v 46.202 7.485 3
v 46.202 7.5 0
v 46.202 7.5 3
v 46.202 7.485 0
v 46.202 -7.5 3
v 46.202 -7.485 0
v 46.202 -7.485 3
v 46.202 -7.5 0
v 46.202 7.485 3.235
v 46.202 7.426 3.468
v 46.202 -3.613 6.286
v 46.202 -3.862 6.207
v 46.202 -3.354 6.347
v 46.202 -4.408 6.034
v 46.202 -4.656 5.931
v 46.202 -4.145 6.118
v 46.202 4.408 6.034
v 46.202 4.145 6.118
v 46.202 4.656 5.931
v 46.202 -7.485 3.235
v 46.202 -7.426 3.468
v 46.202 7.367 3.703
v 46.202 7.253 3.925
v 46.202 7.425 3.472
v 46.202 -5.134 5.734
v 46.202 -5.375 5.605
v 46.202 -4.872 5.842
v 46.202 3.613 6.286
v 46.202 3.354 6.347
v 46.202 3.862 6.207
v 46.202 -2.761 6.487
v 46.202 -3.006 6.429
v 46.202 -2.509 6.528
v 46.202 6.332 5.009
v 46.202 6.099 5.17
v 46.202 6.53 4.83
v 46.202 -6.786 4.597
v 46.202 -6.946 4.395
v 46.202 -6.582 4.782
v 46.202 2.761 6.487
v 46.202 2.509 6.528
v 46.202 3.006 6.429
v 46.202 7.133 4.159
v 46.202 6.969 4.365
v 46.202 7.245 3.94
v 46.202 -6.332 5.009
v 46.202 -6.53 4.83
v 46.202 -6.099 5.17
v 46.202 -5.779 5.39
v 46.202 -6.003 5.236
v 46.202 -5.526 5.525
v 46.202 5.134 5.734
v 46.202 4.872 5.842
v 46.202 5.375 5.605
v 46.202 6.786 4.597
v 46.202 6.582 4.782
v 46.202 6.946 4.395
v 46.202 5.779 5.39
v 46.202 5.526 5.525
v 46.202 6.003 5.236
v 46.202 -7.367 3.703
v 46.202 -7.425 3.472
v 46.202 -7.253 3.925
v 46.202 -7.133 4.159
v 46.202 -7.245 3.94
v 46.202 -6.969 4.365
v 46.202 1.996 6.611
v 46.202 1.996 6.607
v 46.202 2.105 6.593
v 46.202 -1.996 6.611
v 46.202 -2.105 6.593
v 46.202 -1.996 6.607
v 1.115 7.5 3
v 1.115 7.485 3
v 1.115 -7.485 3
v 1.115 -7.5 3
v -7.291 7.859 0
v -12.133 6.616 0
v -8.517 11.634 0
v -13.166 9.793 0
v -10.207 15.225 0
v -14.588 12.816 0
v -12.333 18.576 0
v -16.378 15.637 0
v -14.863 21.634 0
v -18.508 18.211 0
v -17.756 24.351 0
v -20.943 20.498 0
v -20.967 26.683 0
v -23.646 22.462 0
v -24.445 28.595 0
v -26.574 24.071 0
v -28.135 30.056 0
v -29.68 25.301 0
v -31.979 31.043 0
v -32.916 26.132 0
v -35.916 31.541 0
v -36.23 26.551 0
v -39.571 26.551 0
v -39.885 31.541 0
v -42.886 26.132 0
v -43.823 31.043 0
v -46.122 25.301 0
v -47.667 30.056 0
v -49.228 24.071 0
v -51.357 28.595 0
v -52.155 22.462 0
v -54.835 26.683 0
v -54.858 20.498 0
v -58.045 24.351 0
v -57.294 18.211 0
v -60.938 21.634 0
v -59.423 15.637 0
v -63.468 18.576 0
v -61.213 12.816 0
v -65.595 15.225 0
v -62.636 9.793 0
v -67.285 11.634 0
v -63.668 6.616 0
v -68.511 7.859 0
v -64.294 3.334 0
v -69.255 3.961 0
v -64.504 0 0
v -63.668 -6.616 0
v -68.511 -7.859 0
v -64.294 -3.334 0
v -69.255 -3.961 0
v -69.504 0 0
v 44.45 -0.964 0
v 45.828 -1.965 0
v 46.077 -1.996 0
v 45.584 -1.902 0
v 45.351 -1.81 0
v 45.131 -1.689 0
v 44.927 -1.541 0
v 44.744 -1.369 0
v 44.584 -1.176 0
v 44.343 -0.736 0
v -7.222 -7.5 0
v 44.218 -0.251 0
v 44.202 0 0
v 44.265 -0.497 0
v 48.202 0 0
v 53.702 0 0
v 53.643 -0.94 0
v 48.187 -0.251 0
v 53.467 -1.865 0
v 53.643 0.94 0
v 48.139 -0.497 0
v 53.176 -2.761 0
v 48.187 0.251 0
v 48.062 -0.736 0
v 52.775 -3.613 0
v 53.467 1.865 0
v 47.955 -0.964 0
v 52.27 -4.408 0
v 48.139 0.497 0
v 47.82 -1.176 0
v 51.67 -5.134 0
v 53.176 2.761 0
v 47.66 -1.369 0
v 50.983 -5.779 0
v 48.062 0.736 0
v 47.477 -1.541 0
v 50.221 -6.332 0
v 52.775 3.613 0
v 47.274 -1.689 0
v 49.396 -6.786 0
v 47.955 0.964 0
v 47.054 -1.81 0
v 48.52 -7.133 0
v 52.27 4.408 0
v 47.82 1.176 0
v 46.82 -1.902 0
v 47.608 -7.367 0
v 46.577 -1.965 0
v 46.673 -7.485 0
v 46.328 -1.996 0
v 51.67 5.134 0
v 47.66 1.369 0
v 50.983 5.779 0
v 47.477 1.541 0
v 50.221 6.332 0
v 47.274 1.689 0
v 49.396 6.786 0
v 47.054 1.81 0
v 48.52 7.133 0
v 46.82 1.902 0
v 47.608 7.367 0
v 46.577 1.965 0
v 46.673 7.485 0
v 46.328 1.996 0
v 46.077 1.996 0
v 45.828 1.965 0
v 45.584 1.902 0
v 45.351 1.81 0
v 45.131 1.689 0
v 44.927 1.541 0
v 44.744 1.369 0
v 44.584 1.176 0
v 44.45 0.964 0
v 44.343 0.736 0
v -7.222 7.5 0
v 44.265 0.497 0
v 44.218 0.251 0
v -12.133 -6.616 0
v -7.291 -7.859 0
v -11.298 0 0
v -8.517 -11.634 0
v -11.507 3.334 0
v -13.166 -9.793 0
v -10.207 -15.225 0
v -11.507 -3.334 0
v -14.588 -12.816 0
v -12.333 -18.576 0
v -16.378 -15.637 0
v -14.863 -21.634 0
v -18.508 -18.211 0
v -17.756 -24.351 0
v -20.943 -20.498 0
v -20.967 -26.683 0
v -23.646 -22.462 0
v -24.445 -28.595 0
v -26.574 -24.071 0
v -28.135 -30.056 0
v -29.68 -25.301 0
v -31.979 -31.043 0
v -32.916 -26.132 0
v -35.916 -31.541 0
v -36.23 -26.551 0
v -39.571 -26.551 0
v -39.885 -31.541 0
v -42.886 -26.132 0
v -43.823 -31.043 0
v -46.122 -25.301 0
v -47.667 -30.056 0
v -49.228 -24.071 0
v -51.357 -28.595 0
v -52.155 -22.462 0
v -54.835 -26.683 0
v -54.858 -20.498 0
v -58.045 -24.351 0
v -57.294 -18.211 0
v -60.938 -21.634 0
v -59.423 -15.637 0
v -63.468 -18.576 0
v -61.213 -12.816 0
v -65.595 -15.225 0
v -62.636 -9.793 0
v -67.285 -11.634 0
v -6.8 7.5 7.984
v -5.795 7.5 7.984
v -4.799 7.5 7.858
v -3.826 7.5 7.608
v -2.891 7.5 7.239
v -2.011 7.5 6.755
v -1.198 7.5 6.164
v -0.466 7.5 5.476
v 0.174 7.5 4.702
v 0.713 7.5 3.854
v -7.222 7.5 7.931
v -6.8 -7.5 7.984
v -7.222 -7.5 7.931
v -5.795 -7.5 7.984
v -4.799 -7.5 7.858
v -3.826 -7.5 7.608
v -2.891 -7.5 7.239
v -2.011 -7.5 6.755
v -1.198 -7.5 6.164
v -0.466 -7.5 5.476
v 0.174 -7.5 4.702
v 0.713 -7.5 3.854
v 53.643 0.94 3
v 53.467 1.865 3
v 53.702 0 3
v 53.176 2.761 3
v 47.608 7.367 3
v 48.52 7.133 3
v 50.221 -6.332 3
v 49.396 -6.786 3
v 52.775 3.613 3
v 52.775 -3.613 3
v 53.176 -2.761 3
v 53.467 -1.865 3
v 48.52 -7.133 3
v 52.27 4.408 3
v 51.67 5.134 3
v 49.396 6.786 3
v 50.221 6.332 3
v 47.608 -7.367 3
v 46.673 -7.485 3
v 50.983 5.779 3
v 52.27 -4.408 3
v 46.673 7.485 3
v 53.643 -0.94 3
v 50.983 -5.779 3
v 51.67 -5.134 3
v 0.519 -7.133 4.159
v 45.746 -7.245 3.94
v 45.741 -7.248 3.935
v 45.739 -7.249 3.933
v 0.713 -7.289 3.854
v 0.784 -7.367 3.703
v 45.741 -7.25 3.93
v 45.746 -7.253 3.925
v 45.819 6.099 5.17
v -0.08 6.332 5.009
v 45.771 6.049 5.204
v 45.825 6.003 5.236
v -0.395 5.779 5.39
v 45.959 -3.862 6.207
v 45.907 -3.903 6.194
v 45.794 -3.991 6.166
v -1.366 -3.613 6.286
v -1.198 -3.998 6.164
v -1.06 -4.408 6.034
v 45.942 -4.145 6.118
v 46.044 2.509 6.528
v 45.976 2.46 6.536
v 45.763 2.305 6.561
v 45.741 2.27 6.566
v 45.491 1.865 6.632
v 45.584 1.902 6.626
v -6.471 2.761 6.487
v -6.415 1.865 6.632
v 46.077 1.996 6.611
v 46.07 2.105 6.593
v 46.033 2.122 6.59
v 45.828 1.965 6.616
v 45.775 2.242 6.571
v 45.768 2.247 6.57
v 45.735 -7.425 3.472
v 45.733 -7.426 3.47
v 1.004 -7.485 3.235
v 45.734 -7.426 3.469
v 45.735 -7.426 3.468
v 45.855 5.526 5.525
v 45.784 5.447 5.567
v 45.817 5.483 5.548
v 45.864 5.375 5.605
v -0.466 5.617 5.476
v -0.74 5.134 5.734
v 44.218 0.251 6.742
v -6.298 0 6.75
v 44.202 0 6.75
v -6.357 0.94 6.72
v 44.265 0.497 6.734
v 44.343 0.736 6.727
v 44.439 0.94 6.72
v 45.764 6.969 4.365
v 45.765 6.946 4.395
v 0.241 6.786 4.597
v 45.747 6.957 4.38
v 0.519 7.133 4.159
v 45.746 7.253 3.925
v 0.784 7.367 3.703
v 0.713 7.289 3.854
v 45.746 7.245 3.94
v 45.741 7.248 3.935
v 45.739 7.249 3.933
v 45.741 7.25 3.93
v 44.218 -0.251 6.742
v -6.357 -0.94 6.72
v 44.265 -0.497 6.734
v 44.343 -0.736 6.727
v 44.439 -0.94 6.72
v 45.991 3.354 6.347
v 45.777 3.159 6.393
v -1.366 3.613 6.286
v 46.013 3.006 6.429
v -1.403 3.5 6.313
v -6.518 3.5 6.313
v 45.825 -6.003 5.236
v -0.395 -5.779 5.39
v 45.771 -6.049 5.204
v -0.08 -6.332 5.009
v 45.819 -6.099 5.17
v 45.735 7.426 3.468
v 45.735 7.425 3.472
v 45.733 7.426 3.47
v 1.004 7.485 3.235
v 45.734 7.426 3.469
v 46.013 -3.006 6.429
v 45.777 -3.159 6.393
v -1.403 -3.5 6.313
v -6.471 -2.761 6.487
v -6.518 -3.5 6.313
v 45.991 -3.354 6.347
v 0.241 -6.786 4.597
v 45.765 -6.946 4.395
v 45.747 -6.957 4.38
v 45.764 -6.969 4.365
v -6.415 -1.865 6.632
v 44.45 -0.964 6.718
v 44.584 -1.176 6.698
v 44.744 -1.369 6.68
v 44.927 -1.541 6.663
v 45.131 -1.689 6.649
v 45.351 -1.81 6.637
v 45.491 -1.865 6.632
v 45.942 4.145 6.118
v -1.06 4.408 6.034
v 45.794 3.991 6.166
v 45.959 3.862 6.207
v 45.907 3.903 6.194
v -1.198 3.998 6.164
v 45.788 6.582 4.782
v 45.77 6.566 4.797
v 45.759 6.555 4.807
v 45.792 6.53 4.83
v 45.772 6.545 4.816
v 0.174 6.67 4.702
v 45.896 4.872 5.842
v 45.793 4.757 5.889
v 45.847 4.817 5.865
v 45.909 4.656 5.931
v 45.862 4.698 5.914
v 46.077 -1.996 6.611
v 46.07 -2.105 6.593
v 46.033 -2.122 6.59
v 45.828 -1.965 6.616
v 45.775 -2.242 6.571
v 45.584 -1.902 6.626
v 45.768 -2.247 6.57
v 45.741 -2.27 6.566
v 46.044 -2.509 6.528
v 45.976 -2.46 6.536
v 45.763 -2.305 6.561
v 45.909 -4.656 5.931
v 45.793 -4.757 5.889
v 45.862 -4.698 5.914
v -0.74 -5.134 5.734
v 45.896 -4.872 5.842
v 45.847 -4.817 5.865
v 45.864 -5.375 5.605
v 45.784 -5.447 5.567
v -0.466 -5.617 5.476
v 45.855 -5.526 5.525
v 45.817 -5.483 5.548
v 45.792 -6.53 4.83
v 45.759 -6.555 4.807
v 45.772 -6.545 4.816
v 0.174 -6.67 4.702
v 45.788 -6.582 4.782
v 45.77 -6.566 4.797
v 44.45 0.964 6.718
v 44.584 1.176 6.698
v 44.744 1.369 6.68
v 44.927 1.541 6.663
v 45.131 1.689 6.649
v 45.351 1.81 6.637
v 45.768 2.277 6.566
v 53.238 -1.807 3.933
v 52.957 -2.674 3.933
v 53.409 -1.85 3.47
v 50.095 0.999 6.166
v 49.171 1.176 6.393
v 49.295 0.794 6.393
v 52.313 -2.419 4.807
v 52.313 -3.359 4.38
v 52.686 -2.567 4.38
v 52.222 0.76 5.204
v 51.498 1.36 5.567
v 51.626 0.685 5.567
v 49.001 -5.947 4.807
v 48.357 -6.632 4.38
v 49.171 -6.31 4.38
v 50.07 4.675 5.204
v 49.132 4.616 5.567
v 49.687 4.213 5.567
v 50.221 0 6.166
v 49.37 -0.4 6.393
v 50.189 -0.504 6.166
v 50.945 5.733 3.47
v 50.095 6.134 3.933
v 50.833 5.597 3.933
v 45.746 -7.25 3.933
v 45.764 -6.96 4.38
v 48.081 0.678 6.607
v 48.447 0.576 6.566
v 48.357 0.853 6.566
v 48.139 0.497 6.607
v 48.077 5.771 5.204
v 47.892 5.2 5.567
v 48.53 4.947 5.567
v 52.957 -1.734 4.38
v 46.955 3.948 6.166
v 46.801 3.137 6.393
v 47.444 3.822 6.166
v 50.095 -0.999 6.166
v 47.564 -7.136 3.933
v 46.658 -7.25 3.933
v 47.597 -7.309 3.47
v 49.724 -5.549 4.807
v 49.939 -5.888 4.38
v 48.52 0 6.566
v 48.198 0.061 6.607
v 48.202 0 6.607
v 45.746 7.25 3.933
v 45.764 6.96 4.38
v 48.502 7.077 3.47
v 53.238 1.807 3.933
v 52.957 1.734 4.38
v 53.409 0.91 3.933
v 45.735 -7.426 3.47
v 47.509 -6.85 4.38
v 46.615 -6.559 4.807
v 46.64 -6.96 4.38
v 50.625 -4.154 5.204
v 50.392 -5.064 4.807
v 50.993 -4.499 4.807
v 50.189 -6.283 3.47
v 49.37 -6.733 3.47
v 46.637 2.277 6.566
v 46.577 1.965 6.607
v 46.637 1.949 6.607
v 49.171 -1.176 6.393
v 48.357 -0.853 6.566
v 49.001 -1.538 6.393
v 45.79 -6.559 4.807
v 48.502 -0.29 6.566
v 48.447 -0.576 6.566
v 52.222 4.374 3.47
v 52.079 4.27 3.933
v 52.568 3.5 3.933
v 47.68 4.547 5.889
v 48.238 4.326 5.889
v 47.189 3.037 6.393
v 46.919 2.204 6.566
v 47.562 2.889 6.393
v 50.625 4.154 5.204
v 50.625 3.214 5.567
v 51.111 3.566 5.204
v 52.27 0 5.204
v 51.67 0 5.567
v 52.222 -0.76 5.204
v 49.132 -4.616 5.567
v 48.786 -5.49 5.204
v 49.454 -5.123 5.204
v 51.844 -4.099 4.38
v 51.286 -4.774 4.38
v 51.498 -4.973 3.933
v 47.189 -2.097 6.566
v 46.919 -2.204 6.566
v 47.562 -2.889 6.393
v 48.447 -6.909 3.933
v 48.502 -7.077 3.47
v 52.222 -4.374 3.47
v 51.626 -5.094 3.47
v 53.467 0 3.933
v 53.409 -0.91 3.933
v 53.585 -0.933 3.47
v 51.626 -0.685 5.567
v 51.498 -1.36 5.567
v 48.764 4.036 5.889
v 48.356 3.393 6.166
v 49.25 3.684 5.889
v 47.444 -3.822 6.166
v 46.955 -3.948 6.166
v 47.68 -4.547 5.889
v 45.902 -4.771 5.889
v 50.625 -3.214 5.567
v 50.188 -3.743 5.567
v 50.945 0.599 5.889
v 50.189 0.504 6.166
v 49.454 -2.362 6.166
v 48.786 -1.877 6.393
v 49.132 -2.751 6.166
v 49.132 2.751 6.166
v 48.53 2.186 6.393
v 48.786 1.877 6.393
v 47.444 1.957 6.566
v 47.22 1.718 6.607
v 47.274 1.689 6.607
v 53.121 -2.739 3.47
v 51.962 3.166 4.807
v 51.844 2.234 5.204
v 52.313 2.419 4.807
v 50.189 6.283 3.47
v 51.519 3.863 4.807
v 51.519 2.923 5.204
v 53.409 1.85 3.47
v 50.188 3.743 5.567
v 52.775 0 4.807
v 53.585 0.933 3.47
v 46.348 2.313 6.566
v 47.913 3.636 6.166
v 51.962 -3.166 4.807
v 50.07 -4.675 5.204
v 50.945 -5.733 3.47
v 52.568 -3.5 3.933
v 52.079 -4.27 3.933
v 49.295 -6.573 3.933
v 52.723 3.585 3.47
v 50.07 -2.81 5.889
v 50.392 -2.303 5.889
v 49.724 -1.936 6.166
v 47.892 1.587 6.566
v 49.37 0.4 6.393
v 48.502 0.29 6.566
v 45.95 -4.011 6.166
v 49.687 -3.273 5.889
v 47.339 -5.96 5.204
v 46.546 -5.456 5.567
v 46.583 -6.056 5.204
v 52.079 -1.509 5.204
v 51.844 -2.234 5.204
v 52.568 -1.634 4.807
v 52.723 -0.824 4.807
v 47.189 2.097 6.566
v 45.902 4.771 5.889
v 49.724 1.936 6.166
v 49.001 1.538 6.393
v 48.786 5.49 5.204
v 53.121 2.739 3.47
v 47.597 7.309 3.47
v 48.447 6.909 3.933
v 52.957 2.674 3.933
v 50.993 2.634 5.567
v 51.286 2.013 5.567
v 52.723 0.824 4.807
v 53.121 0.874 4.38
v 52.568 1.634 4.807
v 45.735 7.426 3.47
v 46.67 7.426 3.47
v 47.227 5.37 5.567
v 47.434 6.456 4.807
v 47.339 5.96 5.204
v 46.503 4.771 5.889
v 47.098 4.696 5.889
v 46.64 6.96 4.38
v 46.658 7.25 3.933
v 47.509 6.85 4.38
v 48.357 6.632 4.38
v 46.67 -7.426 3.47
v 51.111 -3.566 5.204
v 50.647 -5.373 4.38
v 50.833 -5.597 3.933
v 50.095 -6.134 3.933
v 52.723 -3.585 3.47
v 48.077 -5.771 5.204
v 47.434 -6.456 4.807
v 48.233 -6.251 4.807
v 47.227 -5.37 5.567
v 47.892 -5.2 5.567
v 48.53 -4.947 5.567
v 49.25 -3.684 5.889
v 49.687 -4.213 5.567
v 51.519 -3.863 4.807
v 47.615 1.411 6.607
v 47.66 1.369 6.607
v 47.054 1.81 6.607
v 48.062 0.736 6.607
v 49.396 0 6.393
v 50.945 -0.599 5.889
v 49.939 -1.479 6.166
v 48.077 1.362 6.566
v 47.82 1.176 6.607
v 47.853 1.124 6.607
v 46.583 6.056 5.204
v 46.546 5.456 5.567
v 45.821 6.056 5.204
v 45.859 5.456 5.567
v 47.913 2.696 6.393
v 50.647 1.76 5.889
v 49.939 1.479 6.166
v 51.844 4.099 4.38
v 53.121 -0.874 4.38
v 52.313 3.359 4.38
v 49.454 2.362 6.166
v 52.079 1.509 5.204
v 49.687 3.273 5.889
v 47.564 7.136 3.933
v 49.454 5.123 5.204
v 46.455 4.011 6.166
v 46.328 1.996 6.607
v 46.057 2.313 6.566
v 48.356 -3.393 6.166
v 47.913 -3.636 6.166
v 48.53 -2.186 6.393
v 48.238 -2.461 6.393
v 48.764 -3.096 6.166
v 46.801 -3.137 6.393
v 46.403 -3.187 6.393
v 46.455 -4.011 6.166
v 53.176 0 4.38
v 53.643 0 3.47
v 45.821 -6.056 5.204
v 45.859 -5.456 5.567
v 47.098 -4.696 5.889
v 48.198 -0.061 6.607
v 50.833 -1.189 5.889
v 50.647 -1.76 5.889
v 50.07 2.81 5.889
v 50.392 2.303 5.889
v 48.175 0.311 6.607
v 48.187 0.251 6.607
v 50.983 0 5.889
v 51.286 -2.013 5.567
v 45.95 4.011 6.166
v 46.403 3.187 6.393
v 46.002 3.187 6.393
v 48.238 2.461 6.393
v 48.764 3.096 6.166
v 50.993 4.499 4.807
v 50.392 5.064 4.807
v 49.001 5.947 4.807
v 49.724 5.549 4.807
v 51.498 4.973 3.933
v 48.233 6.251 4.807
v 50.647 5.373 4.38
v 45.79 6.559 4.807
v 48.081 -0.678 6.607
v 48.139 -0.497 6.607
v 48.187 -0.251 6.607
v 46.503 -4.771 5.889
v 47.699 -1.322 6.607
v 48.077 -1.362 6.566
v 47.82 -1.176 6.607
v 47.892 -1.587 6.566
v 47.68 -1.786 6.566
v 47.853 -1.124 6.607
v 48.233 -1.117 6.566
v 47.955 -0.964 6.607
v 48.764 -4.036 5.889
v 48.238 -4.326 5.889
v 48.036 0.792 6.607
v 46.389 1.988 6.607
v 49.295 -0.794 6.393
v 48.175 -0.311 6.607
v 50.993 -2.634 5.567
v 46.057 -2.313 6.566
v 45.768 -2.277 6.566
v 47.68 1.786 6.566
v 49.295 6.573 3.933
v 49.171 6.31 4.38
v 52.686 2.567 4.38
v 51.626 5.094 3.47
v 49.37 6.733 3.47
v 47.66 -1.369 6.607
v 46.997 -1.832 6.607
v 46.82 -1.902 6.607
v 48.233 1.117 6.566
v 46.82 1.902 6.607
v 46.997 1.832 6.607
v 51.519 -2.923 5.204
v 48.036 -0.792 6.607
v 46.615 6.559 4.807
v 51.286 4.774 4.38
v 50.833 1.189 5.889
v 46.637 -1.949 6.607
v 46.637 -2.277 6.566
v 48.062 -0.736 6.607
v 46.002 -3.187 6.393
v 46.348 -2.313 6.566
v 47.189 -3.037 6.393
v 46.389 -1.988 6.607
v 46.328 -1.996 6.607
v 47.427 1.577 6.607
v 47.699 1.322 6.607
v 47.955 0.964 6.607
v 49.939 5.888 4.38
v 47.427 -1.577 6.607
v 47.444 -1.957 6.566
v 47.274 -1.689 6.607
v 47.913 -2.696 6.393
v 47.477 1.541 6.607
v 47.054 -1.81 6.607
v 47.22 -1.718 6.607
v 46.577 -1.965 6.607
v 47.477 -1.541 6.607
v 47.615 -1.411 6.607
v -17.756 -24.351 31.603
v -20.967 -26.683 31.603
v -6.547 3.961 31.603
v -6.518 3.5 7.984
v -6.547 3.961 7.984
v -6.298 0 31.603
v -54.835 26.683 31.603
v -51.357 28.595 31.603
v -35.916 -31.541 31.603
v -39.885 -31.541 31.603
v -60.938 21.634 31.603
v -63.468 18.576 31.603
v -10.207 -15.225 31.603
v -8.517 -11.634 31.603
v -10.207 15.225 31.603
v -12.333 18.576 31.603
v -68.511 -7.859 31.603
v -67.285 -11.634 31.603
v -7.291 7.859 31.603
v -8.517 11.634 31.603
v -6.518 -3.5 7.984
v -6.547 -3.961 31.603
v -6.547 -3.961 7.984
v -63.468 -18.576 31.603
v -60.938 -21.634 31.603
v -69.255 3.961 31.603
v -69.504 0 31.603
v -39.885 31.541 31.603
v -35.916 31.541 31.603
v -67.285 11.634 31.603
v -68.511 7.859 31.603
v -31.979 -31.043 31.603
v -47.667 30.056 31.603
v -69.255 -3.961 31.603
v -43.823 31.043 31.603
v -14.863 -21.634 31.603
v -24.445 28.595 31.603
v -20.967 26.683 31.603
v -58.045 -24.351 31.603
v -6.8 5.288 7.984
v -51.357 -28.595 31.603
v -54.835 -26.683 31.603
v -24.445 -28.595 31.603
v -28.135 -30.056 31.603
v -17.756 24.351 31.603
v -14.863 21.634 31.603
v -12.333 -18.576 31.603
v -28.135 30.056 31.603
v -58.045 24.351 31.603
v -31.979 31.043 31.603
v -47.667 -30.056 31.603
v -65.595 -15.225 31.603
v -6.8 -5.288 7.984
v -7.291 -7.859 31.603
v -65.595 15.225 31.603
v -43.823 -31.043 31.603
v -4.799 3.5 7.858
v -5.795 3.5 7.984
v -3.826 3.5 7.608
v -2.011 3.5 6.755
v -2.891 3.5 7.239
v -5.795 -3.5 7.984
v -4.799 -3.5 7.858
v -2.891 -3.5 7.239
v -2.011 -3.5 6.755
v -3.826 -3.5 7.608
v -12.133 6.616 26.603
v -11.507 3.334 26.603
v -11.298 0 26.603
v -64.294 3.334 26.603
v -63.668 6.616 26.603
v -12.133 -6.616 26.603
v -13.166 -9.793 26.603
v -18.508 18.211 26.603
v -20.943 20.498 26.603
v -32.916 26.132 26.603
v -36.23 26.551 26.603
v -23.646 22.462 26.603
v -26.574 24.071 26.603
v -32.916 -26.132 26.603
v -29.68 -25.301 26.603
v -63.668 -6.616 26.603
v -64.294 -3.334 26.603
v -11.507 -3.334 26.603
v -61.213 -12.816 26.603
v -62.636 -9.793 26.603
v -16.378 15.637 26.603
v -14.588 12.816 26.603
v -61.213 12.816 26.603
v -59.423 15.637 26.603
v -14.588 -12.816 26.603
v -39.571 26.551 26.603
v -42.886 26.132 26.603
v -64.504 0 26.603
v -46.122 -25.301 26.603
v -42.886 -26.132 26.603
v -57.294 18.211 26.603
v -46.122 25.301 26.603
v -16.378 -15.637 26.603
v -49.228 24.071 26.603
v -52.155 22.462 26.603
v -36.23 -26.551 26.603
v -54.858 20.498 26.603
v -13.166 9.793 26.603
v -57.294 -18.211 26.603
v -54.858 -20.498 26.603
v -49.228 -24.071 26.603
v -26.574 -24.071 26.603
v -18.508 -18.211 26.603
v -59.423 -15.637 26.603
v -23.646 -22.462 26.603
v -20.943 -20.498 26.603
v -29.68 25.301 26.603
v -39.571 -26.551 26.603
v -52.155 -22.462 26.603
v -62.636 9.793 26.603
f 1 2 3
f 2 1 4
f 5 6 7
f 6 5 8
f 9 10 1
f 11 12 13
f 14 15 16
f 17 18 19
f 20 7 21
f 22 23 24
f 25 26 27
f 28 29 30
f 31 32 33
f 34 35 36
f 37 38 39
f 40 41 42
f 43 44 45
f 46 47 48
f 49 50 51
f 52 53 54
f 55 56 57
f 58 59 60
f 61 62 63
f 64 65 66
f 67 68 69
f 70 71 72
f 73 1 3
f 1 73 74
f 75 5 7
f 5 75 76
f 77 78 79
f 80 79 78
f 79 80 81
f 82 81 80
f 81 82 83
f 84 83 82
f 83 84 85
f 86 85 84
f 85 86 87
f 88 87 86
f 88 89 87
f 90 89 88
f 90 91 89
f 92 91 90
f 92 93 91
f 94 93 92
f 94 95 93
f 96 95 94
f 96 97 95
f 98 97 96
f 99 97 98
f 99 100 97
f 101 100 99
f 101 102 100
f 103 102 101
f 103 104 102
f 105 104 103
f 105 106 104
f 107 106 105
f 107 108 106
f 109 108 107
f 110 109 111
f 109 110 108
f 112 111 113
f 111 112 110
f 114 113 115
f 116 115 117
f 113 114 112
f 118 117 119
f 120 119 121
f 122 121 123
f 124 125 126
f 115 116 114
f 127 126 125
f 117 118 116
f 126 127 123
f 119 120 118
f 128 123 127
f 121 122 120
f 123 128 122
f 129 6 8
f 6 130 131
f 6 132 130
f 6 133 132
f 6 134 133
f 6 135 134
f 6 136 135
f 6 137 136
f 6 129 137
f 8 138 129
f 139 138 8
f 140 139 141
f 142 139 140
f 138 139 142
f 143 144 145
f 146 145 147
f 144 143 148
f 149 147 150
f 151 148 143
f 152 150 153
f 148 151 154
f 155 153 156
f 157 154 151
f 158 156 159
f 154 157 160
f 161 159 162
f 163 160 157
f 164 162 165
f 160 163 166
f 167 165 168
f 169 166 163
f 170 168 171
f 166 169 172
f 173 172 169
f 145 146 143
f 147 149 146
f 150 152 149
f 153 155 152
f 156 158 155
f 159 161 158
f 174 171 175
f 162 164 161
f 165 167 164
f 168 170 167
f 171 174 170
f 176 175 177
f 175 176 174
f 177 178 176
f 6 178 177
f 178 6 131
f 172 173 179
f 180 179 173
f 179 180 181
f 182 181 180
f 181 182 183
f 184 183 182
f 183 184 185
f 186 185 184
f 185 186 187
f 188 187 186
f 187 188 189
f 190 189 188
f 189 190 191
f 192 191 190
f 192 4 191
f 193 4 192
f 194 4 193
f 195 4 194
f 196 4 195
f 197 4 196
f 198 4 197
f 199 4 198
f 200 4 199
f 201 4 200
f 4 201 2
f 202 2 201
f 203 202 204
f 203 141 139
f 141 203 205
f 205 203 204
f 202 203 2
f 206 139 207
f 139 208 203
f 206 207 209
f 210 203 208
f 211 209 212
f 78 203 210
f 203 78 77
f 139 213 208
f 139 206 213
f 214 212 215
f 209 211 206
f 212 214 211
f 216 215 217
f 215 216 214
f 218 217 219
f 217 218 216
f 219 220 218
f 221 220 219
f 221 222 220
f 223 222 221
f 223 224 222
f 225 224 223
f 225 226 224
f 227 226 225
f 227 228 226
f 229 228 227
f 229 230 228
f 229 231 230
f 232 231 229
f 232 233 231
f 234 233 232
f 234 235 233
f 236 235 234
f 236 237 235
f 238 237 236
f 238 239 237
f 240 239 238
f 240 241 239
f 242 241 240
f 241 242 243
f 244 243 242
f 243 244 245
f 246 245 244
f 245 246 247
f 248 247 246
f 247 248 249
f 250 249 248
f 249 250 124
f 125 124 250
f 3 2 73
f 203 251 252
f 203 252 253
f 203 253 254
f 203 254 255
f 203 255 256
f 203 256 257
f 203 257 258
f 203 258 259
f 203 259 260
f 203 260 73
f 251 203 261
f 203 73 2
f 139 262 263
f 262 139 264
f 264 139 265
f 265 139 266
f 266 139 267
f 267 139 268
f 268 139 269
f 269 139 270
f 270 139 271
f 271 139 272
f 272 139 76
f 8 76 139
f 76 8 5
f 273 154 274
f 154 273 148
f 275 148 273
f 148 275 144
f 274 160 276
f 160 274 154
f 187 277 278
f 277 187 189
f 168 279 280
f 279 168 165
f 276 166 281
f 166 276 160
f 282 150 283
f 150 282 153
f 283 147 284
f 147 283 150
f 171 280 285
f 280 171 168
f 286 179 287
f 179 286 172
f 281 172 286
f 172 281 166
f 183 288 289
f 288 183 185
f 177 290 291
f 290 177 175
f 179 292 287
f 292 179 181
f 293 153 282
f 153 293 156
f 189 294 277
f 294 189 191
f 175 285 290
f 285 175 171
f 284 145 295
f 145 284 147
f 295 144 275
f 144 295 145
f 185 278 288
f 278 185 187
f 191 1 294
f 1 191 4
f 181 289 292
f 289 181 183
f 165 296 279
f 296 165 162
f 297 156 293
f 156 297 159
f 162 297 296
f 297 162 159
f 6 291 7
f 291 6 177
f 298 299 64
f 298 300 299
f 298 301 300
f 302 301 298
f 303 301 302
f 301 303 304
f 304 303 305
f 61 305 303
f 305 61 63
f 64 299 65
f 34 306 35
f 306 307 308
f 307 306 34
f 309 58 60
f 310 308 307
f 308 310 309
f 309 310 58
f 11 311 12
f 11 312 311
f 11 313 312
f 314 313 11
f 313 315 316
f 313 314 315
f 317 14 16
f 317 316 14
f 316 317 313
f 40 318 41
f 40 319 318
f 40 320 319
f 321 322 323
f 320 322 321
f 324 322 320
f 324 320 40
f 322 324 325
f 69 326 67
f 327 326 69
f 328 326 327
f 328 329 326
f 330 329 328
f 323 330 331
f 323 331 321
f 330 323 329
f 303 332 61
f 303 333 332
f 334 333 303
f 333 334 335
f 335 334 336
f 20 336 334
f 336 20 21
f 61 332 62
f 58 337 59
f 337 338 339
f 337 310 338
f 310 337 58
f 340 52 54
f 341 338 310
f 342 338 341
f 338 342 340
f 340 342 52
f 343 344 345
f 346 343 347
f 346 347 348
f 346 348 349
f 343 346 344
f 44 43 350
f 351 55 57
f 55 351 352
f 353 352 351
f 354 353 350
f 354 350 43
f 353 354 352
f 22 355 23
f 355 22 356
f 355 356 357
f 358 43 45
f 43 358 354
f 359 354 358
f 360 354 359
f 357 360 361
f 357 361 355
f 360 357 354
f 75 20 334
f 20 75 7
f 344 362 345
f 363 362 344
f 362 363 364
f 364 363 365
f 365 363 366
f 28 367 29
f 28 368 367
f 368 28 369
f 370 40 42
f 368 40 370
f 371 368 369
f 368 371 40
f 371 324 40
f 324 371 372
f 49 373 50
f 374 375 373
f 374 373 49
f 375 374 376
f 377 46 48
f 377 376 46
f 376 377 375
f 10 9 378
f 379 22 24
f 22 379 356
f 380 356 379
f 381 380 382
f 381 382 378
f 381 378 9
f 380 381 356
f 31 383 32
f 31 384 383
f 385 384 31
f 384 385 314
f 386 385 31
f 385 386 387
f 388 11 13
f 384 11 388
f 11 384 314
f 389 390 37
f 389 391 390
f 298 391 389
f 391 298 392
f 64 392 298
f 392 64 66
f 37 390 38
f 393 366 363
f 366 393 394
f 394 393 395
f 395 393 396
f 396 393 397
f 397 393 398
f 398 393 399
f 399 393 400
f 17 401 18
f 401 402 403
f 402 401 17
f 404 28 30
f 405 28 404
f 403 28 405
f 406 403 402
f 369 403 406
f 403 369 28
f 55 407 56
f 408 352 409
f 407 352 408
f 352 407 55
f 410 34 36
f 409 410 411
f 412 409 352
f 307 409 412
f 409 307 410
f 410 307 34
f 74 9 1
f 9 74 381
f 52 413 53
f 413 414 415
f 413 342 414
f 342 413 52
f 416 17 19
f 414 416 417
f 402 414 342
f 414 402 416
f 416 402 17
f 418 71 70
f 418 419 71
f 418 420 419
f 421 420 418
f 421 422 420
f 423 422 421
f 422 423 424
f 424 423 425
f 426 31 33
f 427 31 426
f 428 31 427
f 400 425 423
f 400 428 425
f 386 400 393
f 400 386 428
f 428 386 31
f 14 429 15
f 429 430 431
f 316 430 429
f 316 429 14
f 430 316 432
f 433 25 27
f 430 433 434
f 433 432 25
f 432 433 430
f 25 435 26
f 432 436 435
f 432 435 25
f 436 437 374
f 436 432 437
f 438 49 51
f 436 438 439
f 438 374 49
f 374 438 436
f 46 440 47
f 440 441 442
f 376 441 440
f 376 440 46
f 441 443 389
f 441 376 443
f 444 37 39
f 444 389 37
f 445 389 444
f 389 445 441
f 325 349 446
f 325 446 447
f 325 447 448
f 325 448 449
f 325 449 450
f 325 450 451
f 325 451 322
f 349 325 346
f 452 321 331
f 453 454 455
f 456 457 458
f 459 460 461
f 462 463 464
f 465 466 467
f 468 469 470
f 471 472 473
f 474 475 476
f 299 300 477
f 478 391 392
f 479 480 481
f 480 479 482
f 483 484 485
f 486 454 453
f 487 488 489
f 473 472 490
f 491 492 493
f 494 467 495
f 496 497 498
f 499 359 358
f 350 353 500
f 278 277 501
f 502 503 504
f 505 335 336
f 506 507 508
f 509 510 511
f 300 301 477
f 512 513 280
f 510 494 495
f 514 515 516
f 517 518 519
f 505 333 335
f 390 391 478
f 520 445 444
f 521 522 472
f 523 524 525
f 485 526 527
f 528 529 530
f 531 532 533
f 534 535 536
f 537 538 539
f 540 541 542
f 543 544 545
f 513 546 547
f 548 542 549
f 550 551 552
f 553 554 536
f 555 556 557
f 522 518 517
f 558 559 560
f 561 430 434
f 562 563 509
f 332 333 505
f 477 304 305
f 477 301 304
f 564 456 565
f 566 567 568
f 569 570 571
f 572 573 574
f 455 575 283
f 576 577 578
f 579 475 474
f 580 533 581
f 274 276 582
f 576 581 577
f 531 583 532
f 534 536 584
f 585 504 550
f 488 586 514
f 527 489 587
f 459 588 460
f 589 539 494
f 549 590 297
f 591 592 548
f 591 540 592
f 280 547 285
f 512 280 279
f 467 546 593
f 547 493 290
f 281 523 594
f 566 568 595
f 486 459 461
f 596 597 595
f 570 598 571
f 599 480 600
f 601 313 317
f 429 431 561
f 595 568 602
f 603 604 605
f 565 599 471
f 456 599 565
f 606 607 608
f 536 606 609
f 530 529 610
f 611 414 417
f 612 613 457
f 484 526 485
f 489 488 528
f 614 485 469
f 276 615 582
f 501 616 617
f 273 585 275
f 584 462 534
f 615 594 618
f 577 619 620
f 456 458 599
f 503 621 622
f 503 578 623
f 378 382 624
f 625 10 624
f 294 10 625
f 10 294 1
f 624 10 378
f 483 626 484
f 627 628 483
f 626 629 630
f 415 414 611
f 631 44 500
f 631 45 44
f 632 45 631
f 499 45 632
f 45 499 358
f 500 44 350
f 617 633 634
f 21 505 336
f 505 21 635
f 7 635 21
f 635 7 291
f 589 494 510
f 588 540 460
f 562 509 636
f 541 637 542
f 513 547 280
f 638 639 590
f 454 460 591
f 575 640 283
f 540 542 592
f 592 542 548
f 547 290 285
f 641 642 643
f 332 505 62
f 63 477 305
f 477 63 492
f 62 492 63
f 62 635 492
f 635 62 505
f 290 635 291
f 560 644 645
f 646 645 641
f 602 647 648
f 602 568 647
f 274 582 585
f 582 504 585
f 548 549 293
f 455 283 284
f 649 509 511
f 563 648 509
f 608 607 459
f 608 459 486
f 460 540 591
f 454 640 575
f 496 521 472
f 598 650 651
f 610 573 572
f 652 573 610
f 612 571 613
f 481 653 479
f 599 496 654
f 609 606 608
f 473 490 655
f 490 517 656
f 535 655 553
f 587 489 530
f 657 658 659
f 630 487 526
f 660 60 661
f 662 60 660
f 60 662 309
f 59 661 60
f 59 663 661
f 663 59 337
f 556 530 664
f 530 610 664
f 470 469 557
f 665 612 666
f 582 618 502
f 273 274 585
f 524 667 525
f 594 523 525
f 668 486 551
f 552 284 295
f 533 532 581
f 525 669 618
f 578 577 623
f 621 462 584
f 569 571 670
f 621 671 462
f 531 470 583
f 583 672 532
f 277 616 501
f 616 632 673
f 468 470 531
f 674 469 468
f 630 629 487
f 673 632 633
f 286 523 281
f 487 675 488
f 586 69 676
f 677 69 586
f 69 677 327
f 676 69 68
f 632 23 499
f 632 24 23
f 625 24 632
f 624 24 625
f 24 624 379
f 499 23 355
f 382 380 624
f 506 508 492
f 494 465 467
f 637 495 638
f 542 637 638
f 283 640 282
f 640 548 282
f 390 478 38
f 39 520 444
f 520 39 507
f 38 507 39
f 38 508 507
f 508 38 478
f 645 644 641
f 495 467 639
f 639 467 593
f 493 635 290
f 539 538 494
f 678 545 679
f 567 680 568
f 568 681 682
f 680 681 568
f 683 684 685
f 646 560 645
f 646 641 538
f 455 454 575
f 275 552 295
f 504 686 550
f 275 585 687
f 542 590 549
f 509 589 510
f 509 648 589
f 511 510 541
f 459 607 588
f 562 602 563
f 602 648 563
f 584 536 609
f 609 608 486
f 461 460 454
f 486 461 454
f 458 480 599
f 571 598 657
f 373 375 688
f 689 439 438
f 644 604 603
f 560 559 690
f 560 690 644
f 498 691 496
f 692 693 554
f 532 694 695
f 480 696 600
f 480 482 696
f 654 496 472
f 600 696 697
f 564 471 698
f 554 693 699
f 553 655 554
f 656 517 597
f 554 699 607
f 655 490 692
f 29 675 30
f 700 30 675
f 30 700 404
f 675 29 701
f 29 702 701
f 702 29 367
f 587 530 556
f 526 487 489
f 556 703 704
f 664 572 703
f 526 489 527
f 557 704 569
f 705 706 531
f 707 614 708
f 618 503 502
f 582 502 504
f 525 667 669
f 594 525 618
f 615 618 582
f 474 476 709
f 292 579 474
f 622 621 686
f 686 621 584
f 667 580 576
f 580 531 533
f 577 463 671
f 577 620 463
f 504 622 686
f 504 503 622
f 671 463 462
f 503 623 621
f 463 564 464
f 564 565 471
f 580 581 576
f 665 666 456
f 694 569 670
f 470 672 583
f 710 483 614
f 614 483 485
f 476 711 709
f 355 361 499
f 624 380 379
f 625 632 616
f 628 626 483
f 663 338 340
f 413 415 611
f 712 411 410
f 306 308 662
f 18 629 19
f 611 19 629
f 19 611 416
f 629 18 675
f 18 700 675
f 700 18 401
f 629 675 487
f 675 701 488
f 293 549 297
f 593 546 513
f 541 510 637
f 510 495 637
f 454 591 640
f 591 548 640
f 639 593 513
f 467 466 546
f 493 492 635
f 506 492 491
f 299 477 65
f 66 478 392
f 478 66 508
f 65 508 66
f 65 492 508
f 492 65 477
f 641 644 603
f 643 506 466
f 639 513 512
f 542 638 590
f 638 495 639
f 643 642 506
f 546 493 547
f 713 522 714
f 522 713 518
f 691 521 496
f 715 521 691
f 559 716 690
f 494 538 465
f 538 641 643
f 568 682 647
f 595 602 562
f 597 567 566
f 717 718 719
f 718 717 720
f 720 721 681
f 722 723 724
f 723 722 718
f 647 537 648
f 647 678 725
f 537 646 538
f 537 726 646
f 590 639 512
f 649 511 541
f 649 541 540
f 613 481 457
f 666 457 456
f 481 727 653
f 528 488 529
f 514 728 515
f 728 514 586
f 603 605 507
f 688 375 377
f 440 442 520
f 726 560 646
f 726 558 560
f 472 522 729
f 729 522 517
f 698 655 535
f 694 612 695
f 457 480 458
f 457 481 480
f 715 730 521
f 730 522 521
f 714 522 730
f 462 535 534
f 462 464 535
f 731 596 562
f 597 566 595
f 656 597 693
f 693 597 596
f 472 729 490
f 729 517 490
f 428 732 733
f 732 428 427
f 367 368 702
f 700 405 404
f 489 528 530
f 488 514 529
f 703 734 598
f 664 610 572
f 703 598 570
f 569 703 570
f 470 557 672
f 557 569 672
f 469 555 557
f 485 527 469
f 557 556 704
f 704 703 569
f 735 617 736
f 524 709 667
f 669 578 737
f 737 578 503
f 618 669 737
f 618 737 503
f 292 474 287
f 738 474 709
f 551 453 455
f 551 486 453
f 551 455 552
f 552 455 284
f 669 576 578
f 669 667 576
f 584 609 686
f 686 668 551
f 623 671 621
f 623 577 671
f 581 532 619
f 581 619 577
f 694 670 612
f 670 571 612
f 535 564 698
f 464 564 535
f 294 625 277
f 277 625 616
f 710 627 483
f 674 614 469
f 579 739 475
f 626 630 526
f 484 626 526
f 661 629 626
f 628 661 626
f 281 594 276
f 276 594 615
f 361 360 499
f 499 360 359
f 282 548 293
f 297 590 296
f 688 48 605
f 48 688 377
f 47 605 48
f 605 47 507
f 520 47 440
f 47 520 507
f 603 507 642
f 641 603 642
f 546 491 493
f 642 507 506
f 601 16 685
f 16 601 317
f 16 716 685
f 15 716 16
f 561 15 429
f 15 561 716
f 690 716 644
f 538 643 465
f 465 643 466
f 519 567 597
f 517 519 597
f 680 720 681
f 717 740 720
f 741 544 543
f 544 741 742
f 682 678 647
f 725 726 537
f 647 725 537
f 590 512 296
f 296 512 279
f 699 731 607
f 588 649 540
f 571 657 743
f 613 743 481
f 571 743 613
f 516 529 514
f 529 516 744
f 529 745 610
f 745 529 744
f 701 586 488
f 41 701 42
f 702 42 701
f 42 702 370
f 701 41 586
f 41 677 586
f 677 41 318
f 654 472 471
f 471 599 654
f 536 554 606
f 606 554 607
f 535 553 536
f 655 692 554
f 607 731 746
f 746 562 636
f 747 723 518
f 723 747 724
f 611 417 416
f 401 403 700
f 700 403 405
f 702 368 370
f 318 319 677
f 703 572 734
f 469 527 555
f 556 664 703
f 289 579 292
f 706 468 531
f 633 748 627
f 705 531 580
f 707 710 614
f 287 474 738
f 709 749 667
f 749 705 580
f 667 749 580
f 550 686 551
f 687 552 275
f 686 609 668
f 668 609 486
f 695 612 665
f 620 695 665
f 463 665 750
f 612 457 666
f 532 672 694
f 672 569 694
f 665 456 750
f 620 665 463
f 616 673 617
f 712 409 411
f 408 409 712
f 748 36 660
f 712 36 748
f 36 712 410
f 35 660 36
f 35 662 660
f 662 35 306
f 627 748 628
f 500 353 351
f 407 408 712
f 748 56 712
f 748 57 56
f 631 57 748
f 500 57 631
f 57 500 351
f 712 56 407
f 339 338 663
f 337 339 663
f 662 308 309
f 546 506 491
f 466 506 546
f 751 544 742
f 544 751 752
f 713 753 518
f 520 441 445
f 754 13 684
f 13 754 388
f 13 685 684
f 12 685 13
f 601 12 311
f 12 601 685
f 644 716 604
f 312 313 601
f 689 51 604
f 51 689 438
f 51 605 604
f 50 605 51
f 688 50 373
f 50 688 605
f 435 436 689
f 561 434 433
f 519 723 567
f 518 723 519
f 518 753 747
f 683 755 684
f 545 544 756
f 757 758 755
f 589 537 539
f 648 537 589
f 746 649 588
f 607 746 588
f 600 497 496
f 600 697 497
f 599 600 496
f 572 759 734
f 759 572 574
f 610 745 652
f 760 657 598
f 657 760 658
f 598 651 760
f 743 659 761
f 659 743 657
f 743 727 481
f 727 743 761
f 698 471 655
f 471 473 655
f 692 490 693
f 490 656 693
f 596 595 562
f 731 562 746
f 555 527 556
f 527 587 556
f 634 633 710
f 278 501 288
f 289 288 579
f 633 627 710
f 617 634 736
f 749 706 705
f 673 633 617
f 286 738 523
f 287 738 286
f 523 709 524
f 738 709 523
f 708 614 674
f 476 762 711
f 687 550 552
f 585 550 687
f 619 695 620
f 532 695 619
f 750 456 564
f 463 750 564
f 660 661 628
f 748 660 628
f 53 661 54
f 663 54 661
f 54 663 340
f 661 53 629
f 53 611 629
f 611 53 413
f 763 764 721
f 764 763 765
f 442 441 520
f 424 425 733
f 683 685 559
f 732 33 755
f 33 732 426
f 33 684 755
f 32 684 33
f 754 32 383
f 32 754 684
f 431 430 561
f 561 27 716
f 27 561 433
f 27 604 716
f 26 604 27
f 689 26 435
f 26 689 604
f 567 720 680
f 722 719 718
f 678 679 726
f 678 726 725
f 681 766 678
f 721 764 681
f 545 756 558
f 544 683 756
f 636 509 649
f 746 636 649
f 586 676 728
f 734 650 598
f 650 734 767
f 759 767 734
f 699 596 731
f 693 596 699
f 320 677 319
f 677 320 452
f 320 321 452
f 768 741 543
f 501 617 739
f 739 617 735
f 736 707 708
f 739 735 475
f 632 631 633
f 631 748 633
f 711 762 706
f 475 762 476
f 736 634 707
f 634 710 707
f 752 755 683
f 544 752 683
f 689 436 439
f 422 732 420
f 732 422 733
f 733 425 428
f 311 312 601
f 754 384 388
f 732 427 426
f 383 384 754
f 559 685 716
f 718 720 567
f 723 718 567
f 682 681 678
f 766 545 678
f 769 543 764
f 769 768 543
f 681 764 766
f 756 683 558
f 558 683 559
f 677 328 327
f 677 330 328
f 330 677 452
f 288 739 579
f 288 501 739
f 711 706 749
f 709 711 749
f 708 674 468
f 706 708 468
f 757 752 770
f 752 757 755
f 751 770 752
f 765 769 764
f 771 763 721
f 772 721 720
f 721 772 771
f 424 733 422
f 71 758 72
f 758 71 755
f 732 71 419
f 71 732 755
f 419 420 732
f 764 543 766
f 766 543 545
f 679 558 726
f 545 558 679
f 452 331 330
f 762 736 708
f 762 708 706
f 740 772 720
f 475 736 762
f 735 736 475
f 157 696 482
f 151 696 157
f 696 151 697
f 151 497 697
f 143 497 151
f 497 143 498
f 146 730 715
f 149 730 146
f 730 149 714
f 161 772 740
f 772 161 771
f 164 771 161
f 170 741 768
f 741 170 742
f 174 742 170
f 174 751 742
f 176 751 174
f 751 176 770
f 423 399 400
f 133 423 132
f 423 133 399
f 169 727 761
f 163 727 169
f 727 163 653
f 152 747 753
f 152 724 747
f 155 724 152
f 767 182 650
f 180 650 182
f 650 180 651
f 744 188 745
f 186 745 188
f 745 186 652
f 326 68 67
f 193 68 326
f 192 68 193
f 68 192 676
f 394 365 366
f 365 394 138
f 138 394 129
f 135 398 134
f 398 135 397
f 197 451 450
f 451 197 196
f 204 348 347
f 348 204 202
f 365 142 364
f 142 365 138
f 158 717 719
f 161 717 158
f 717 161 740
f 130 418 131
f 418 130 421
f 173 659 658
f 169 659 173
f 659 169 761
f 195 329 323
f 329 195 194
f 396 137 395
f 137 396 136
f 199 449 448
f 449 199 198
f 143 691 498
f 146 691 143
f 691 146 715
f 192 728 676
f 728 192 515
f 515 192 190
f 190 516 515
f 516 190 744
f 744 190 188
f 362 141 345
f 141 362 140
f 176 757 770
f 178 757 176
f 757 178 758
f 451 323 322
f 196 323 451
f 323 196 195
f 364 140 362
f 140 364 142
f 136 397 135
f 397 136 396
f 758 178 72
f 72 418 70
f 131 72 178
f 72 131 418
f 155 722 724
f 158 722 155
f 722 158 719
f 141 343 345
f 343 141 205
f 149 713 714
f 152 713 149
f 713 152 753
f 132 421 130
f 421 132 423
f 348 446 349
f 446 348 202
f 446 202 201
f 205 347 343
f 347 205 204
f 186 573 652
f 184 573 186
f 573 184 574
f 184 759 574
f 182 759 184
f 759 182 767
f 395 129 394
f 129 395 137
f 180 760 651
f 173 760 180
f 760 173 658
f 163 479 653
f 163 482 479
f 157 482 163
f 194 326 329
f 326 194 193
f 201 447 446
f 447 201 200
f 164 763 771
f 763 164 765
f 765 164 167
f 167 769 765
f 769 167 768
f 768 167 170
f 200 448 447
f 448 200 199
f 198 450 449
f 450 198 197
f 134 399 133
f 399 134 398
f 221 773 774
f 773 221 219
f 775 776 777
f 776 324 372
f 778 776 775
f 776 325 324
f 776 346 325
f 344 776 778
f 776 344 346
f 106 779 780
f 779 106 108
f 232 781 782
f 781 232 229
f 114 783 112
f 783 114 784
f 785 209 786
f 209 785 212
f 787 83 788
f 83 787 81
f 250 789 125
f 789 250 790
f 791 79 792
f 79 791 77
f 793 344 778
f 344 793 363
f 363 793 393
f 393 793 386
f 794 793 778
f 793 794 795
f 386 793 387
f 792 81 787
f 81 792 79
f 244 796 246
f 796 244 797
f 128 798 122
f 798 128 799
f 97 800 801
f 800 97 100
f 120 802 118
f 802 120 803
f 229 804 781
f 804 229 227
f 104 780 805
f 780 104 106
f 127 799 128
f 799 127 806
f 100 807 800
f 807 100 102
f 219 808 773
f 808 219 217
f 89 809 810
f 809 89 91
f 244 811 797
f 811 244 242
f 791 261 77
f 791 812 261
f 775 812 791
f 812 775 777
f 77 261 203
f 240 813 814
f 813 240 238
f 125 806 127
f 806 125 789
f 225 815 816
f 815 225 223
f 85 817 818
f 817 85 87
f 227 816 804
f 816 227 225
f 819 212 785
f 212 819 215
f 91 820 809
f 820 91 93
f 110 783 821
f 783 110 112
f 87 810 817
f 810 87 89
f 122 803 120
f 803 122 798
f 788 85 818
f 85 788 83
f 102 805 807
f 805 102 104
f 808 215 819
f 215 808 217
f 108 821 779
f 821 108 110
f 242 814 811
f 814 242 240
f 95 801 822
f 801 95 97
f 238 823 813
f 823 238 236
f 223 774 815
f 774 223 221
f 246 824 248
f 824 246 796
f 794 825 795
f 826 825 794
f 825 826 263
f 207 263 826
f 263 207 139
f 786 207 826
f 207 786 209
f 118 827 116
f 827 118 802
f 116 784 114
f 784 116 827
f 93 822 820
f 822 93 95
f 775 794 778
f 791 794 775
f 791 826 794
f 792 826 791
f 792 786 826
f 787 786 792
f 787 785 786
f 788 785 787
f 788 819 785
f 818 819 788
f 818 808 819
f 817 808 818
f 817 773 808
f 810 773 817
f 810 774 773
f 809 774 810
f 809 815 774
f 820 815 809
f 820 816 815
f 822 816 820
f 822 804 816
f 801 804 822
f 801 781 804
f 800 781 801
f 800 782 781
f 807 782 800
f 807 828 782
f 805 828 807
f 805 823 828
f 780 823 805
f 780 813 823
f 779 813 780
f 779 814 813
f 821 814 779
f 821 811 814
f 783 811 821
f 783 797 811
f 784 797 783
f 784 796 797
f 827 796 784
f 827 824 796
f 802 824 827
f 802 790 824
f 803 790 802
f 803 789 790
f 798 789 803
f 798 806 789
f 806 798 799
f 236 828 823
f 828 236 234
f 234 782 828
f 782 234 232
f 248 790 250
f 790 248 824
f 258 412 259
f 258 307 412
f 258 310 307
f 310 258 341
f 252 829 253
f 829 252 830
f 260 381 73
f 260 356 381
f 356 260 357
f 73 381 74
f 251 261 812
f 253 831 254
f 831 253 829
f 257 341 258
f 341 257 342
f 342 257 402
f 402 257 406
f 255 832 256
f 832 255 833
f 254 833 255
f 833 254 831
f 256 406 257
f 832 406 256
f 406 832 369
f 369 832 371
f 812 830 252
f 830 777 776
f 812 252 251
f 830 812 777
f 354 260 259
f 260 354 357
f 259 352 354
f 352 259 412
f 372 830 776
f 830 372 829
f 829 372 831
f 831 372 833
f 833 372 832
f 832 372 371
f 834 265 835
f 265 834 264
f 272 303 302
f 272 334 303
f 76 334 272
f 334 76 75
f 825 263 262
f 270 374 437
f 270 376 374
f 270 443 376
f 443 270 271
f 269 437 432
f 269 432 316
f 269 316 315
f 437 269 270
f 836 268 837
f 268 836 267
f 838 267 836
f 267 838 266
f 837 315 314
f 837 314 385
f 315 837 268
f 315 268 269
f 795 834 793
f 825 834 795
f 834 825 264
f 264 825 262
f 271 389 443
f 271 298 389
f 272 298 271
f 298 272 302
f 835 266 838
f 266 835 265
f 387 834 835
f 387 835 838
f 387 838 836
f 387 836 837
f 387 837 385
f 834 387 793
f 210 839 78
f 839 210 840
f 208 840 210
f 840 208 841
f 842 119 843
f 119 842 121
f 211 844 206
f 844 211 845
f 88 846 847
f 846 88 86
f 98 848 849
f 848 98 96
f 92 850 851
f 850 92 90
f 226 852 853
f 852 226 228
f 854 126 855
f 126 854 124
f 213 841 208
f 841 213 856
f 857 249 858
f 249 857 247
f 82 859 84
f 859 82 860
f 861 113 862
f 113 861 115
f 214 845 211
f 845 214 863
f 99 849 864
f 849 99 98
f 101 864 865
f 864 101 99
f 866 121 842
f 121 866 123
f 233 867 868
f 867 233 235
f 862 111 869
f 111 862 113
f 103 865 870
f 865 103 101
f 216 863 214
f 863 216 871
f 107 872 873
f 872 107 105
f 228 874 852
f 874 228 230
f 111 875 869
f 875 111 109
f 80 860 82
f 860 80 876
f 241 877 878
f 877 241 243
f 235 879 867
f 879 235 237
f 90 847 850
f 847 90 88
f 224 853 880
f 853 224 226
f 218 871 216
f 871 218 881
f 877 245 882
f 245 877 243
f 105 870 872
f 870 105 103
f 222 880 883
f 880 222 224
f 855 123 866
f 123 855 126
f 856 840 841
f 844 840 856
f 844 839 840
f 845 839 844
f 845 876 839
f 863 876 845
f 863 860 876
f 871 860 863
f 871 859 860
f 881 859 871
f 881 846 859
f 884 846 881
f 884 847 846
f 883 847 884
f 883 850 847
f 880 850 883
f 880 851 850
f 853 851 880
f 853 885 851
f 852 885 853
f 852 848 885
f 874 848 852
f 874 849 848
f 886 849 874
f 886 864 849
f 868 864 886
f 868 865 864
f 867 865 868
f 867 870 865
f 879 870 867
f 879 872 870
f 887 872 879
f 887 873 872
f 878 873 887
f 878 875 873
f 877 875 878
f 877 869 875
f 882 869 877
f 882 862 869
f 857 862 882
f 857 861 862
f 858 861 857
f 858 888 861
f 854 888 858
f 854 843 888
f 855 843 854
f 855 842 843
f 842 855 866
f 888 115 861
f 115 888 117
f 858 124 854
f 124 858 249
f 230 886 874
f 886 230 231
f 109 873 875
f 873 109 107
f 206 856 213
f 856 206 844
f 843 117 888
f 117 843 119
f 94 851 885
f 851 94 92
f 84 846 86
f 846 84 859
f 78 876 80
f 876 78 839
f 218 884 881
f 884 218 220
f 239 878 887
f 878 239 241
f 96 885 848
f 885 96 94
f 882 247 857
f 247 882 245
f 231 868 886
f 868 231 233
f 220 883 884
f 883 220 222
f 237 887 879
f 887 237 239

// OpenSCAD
// [FL_INDEX: keywords="openscad, 3d_parametric, Customizable_Measuring_Cup, csg_solid" | COT="Parametric OpenSCAD design from 3DCodeverse"]
// Title: Customizable Measuring Cup

// Customized Measuring Cup
// v 1.0
//
// (C) Copyright 2013, Brian Enigma, some rights reserved.
//
// Customized Measuring Cup by Brian Enigma is licensed under a Creative Commons 
// Attribution-ShareAlike 3.0 Unported License.
//
// - http://netninja.com
// - http://www.thingiverse.com/BrianEnigma

/*
Calculation Notes:

Cups       Cups (Reduced)      ml
~~~~       ~~~~~~~~~~~~~~      ~~
1/8        1/8     0.125       29.57
2/8        1/4     0.25        59.15
3/8        3/8     0.375       88.72
4/8        1/2     0.5         118.30
5/8        5/8     0.625       147.87
6/8        3/4     0.75        177.44
7/8        7/8     0.875       207.02
8/8        1       1           236.59

Volume of cylinder = pi * r^2 * h

If we make radius and height the same: 

v = pi * h^2 * h = pi * h^3

solve for h

h = cube_root(v) / cube_root(pi) * 10 = 6.8278 * cube_root(v)

h = 6.8278 * pow(v, 1/3)
*/

// Pick a predefined volume or select "Custom" to pick your own
volume = 59.15; // [29.57:1/8 Cup, 59.15:1/4 Cup, 88.72:3/8 Cup, 118.30:1/2 Cup, 147.87:5/8 Cup, 177.44:3/4 Cup, 207.02:7/8 Cup, 236.59:1 Cup, 0:Custom]
// If using a custom volume, pick a value
custom_volume_in_milliliters = 15; // [15:500]

// The thickness of the scoop wall
wall_thickness = 5; // [1:8]

// width of handle
handle_width = 15; // [10:20]

// length of handle (actually, not including the end-cap)
handle_length = 60; // [15:80]

// The diameter (in mm) of the hole in the handle
hanger_hole_hole_diameter = 4; // [0:5]

handle_thickness = 3 * 1;

// resolution of cylinders -- 10 makes for quick renders, higher makes for good prints
//DETAIL = 30 * 1;
DETAIL = 50 * 1;
//DETAIL = 100 * 1;

module handle(outer_wall_radius, handle_thickness, handle_width, handle_length, hanger_hole_hole_diameter) 
{
    difference()
    {
        union()
        {
            // flat handle part
            translate(v = [0, handle_width / -2, 0])
            	cube(size = [handle_length + outer_wall_radius - handle_width / 2, handle_width, handle_thickness]);
            // flat cap at end of handle
            translate(v = [handle_length + outer_wall_radius - handle_width / 2, 0, 0]) 
            	cylinder(h = handle_thickness, r = handle_width / 2, $fn = DETAIL);
			// curved handle part
            translate(v = [0, 0, handle_thickness])
				scale(v = [1, 1, 0.5])
					rotate(a = [0, 90, 0])
            			cylinder(h = handle_length + outer_wall_radius - handle_width / 2, r = handle_width / 2, $fn = DETAIL);
			// curved cap at end of handle
            translate(v = [handle_length + outer_wall_radius - handle_width / 2, 0, handle_thickness])
				scale(v = [1, 1, 0.5])
           			sphere(r = handle_width / 2, $fn = DETAIL);
			
        }
    	// subtract out hanger hole
    	translate(v = [handle_length + outer_wall_radius - handle_width / 2, 0, -1]) 
    		cylinder(h = handle_thickness * 10, r = hanger_hole_hole_diameter / 2, $fn = DETAIL);
	}
}

module build_measuring_cup(volume, height, radius, handle_thickness, handle_width, handle_length, handle_hole_diameter)
{
	echo(str("Building measuring cup with volume ", volume, "ml, height ", height, "mm, radius ", radius, "mm."));
	translate(v = [((radius + wall_thickness) / 2 + handle_length) / -2, 0, 0]) // slide over to be better centered on the table
		difference()
		{
			union()
			{
				// Outer cylinder
			    cylinder(h = height + wall_thickness, r = radius + wall_thickness, $fn = DETAIL);
				// Handle braces
				translate(v = [radius + wall_thickness, handle_width / 2, 0])
					rotate(a = [90, 0, 0])
						cylinder(h = 4, r = 8, $fn = DETAIL);
				translate(v = [radius + wall_thickness, handle_width / -2 + 4, 0])
					rotate(a = [90, 0, 0])
						cylinder(h = 4, r = 8, $fn = DETAIL);
				// Handle
				handle(radius + wall_thickness, handle_thickness, handle_width, handle_length, handle_hole_diameter);
			}
			// Subtract out inner cylinder
			translate(v = [0, 0, -1])
		    	cylinder(h = height + 1, r = radius, $fn = DETAIL);
			// Subtract out anything below the floor (e.g. leftover bits of the handle brace)
			translate(v = [radius * -2, (radius * 4) / -2, -50])
				cube(size = [radius * 2 + handle_length * 3 + 100, radius * 4, 50]);
		}
}

if (0 == volume)
{
	echo("Building custom measuring cup");
	build_measuring_cup(
		custom_volume_in_milliliters, 
		6.8278 * pow(custom_volume_in_milliliters, 1/3), 
		6.8278 * pow(custom_volume_in_milliliters, 1/3), 
		handle_thickness, 
		handle_width,
		handle_length, 
		hanger_hole_hole_diameter);
} else {
	echo("Building predefined measuring cup");
	echo(str("Test: ", pow(volume, 1/3)));
	build_measuring_cup(
		volume, 
		6.8278 * pow(volume, 1/3), 
		6.8278 * pow(volume, 1/3), 
		handle_thickness, 
		handle_width,
		handle_length, 
		hanger_hole_hole_diameter);
}
